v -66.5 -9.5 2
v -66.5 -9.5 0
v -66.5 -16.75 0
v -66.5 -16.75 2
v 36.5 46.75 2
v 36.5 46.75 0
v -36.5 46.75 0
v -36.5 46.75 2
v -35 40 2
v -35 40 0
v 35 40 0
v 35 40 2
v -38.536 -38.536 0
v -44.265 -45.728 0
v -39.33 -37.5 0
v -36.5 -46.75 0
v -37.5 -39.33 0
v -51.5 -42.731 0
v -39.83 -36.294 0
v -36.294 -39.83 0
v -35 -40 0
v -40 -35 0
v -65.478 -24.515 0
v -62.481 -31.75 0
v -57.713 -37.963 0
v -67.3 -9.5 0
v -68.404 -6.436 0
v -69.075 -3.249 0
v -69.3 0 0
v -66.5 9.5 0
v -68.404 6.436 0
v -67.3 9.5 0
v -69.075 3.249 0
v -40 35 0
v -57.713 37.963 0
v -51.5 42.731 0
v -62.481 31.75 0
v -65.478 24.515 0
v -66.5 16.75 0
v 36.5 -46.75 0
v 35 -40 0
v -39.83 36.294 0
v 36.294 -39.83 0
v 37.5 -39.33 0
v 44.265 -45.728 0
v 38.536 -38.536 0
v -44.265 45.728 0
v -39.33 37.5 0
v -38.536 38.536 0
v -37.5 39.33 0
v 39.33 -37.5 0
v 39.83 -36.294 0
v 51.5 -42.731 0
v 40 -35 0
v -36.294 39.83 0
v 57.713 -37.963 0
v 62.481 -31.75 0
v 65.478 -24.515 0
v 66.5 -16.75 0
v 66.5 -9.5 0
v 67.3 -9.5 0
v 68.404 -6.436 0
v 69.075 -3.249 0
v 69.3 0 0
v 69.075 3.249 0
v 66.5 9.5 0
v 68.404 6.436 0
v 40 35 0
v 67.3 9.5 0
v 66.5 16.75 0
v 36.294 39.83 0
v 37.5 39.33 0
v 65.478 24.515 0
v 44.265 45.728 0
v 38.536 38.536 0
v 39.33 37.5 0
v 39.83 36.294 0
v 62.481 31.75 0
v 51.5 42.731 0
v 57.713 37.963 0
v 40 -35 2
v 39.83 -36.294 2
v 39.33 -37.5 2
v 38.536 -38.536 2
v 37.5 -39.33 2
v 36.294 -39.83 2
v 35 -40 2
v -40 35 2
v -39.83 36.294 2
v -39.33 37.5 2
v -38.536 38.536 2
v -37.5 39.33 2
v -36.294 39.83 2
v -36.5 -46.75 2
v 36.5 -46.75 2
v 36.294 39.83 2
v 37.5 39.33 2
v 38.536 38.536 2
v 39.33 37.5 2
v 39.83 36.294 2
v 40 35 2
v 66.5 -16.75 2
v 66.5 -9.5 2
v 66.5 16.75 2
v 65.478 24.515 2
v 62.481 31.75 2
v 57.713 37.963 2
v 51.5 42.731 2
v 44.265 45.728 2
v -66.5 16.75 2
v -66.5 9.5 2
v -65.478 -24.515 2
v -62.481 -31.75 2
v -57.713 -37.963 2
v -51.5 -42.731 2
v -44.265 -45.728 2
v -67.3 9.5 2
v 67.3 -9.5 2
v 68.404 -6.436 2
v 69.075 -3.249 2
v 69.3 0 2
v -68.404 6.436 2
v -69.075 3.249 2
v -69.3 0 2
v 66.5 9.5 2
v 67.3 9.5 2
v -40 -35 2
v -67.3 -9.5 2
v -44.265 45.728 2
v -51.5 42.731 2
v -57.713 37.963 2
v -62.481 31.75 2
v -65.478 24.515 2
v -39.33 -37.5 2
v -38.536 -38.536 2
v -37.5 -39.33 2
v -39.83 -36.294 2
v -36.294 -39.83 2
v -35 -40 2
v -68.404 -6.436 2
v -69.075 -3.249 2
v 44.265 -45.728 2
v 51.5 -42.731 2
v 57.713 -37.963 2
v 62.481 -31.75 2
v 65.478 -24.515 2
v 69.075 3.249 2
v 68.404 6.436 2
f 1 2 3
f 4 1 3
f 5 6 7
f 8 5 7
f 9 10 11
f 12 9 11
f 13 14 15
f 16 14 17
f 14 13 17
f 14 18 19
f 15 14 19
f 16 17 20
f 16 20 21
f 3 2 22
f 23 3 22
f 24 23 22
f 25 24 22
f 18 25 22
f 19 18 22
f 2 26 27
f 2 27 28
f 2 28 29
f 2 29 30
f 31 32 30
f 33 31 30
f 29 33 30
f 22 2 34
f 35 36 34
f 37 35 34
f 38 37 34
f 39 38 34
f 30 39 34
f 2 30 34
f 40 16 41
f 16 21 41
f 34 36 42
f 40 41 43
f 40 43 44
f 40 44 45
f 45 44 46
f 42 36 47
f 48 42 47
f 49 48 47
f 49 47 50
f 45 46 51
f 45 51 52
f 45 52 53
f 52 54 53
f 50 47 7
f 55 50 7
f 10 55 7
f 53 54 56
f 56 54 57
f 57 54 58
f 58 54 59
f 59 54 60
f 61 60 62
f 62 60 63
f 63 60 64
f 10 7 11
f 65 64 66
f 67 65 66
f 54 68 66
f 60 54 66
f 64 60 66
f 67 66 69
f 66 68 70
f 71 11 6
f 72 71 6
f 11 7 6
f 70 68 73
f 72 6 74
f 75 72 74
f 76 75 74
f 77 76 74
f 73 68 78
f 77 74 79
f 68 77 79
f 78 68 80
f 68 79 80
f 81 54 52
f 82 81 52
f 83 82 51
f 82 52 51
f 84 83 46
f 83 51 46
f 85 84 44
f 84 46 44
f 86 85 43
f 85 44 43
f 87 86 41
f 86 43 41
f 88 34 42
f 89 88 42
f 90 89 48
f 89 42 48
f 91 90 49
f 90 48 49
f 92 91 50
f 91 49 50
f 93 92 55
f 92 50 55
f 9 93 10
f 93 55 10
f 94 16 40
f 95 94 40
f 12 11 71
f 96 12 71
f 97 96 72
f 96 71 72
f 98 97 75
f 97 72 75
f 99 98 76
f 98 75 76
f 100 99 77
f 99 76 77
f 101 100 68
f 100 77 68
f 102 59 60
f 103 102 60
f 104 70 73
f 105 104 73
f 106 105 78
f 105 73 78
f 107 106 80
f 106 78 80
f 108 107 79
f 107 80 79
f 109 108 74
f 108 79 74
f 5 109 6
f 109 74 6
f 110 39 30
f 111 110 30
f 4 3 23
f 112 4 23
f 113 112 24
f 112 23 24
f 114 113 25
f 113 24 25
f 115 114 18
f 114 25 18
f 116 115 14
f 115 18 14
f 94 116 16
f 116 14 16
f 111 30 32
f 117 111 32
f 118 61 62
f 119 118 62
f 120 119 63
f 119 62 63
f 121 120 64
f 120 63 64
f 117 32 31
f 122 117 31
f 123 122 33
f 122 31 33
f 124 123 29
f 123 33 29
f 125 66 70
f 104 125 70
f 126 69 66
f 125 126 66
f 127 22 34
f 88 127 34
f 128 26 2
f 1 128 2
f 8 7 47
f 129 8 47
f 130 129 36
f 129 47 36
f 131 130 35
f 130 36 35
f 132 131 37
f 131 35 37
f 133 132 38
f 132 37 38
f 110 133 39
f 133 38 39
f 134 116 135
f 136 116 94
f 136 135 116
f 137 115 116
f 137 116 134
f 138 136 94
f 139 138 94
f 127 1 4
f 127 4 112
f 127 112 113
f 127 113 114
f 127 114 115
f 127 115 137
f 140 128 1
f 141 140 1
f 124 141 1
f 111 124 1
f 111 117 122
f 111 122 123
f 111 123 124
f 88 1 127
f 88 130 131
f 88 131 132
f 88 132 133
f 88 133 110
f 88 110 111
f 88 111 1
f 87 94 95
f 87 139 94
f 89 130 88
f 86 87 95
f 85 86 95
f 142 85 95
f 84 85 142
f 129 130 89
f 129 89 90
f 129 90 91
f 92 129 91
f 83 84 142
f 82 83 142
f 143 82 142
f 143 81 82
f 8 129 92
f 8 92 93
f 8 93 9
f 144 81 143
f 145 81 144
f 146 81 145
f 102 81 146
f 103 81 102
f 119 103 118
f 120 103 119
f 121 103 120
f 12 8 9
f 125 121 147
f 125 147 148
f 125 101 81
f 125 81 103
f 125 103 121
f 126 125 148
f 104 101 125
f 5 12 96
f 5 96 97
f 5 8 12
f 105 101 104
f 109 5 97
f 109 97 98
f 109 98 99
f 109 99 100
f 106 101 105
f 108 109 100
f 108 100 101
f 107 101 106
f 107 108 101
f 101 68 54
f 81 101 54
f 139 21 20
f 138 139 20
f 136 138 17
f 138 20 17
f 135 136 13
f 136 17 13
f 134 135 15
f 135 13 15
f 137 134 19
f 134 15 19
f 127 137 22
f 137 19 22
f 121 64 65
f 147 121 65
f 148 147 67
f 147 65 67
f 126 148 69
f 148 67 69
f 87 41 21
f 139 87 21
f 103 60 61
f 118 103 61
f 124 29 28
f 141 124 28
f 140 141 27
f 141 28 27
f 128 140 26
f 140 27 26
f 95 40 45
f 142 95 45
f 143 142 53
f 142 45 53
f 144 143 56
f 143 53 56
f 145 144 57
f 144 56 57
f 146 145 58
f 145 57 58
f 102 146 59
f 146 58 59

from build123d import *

# Parameters (mm, degrees)
F1_DEPTH = 2


with BuildPart() as f1:
    # F0 (on Top) → F1 (new body)
    with BuildSketch(Plane.XY):
        with BuildLine():
            ThreePointArc((66.5, 16.75), (57.7132034356, 37.9632034356), (36.5, 46.75))
            Line((36.5, 46.75), (-36.5, 46.75))
            ThreePointArc((-36.5, 46.75), (-57.7132034356, 37.9632034356), (-66.5, 16.75))
            Line((-66.5, 16.75), (-66.5, 9.5))
            Line((-66.5, 9.5), (-66.5, -9.5))
            Line((-66.5, -9.5), (-66.5, -16.75))
            ThreePointArc((-66.5, -16.75), (-57.7132034356, -37.9632034356), (-36.5, -46.75))
            Line((-36.5, -46.75), (36.5, -46.75))
            ThreePointArc((36.5, -46.75), (57.7132034356, -37.9632034356), (66.5, -16.75))
            Line((66.5, -16.75), (66.5, -9.5))
            Line((66.5, -9.5), (66.5, 9.5))
            Line((66.5, 9.5), (66.5, 16.75))
        make_face()
        with BuildLine():
            Line((-35, 40), (35, 40))
            ThreePointArc((35, 40), (38.5355339059, 38.5355339059), (40, 35))
            Line((40, 35), (40, -35))
            ThreePointArc((40, -35), (38.5355339059, -38.5355339059), (35, -40))
            Line((35, -40), (-35, -40))
            ThreePointArc((-35, -40), (-38.5355339059, -38.5355339059), (-40, -35))
            Line((-40, -35), (-40, 35))
            ThreePointArc((-40, 35), (-38.5355339059, 38.5355339059), (-35, 40))
        make_face(mode=Mode.SUBTRACT)
        with BuildLine():
            Line((67.3, 9.5), (66.5, 9.5))
            Line((66.5, 9.5), (66.5, -9.5))
            Line((66.5, -9.5), (67.3, -9.5))
            ThreePointArc((67.3, -9.5), (68.7945793088, -4.8541219597), (69.3, 0))
            ThreePointArc((69.3, 0), (68.7945793088, 4.8541219597), (67.3, 9.5))
        make_face()
        with BuildLine():
            Line((-66.5, -9.5), (-66.5, 9.5))
            Line((-66.5, 9.5), (-67.3, 9.5))
            ThreePointArc((-67.3, 9.5), (-68.7945793088, 4.8541219597), (-69.3, 0))
            ThreePointArc((-69.3, 0), (-68.7945793088, -4.8541219597), (-67.3, -9.5))
            Line((-67.3, -9.5), (-66.5, -9.5))
        make_face()
    extrude(amount=F1_DEPTH)


solid = f1.part
